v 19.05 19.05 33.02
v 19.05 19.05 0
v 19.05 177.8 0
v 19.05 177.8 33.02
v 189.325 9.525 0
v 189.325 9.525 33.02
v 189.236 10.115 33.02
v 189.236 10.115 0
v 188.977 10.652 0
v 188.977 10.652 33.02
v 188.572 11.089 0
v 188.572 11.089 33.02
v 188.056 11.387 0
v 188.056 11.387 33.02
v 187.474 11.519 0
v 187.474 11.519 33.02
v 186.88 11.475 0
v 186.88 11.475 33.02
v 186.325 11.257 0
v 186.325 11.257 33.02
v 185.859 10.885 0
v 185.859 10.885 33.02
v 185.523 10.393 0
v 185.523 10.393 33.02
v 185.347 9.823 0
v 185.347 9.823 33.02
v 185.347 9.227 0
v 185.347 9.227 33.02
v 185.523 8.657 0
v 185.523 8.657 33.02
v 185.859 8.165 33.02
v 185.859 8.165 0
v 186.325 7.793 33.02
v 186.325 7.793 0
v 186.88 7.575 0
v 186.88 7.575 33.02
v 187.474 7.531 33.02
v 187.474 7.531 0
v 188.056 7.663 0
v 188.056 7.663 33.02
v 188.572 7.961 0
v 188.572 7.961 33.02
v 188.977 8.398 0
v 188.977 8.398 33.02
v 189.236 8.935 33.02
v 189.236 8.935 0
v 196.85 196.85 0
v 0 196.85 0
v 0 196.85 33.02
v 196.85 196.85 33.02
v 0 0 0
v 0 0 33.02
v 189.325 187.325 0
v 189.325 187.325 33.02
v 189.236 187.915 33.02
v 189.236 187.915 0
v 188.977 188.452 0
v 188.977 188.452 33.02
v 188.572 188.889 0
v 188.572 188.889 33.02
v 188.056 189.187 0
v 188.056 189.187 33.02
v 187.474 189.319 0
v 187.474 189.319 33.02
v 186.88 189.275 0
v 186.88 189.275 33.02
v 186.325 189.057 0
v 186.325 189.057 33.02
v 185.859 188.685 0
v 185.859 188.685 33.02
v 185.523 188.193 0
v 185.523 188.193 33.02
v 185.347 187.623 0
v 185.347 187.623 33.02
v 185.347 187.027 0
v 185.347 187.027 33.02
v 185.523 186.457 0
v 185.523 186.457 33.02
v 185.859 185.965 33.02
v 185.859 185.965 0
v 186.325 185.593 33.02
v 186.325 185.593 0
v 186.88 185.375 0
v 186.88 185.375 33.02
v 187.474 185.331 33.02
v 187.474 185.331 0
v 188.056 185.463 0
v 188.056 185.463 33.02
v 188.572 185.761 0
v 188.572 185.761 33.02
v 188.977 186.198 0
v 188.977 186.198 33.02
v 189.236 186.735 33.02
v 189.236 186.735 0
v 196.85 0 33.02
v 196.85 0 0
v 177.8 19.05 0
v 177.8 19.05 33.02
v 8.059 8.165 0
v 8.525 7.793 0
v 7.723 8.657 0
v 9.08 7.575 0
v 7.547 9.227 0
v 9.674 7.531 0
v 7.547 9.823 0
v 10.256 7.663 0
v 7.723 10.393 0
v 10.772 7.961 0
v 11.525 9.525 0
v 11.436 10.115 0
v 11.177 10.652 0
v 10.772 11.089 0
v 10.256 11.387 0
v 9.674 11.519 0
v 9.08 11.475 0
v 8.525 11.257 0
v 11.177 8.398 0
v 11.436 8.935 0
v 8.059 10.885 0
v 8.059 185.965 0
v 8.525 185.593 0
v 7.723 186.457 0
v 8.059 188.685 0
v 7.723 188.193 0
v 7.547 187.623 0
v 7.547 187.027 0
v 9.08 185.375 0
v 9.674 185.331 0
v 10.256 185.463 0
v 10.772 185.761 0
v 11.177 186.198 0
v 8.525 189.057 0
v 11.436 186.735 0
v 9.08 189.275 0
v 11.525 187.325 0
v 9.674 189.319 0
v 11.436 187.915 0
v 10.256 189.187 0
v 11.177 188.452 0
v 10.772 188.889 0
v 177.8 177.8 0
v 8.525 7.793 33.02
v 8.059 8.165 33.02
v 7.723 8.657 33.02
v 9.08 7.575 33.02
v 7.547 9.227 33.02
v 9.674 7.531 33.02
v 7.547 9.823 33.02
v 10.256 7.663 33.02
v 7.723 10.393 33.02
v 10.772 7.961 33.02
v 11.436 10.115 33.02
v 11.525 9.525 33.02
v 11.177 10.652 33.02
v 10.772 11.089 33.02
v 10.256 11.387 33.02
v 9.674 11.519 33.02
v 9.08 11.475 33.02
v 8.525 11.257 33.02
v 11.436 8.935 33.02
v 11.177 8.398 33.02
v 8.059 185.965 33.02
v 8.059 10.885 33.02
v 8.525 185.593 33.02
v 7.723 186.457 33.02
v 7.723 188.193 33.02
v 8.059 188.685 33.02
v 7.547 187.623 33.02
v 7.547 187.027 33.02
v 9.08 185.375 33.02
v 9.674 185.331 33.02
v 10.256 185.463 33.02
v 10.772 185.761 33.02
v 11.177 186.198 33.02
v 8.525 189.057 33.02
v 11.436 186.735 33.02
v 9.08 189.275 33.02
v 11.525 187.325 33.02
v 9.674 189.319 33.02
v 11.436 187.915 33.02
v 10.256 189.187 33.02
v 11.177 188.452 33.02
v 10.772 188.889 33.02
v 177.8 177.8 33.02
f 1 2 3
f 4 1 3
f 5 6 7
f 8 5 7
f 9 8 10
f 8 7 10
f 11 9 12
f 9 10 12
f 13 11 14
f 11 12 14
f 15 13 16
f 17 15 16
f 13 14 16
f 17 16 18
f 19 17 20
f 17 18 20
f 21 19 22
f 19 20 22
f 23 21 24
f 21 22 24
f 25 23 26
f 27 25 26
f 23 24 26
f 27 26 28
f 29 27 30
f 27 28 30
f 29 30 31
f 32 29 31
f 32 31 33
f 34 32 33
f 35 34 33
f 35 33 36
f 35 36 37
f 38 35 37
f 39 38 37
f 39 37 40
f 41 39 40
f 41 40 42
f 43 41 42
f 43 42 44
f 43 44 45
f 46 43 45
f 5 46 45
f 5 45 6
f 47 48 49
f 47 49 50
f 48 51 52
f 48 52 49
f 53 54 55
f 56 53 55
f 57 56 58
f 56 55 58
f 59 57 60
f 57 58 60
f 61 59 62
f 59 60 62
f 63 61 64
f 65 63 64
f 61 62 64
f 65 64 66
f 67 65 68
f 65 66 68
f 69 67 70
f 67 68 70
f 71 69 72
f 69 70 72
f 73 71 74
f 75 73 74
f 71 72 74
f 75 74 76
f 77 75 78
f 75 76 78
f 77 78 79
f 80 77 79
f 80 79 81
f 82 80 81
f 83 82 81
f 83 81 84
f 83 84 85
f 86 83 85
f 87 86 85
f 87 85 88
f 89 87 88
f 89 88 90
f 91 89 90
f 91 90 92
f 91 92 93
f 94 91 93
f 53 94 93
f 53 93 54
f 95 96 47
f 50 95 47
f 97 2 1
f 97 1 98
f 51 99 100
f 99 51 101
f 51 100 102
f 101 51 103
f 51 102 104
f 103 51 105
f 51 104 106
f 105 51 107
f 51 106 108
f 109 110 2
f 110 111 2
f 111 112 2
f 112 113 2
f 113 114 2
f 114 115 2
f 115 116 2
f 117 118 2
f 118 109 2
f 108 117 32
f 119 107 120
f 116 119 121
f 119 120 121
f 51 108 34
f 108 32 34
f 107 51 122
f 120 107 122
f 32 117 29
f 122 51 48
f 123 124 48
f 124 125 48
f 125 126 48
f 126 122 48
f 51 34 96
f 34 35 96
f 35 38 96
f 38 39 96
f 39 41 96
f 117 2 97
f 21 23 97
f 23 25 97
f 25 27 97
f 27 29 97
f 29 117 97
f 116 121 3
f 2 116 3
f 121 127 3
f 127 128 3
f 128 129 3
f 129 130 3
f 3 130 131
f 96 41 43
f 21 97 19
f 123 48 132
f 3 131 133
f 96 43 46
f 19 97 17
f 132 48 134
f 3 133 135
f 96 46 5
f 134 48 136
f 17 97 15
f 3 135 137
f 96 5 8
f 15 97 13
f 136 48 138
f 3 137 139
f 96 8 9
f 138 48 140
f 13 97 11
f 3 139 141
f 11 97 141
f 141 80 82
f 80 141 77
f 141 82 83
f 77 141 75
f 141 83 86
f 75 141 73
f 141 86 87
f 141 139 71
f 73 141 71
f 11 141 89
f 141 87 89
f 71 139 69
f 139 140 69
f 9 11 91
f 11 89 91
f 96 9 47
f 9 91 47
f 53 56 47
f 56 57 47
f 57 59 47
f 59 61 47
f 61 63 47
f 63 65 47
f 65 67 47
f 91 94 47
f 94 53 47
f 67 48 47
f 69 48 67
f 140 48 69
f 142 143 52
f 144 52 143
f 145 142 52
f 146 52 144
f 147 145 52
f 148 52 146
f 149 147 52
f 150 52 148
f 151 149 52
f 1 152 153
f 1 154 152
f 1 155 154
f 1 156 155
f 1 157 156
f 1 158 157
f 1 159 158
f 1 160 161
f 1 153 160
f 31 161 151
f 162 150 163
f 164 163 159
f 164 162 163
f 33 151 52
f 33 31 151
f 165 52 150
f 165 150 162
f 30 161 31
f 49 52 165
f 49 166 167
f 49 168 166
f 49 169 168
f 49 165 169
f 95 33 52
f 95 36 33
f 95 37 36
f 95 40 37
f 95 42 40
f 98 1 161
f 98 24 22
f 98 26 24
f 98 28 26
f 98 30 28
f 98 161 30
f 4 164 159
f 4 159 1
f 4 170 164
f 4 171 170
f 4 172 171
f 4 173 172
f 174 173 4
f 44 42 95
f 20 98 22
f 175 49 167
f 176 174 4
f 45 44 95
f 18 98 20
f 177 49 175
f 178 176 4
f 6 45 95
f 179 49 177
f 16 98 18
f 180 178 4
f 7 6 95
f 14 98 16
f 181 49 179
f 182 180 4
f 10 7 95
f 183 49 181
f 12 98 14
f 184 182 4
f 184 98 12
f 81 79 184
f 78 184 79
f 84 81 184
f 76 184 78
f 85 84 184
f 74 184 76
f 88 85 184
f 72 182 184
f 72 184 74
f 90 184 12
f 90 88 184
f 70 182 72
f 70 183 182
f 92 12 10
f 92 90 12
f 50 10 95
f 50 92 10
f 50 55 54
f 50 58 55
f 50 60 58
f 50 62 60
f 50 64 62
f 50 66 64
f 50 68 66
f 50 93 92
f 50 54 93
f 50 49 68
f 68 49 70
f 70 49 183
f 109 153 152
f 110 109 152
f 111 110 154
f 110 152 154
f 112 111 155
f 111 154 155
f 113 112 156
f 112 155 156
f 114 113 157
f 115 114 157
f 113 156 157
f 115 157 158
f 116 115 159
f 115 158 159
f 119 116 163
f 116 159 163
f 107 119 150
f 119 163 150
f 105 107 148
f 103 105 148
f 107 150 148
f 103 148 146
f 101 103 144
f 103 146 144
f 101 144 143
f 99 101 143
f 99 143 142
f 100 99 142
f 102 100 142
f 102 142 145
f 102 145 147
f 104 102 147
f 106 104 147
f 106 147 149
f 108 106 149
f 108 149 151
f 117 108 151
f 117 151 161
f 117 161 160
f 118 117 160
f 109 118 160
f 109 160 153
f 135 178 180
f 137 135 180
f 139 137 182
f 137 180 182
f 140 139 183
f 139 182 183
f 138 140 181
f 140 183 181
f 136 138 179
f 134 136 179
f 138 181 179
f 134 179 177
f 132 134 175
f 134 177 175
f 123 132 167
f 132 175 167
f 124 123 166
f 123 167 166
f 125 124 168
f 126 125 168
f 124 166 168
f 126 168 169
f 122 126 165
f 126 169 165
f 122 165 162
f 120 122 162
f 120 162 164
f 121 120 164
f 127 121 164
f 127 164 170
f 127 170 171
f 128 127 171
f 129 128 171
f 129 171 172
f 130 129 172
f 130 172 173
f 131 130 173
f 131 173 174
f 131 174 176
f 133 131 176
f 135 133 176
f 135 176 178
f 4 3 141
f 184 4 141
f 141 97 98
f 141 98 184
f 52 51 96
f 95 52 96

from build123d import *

# Parameters (mm, degrees)
SKETCH001_R      = 2
EXTRUDE001_DEPTH = 40
SKETCH_W         = 196.85
SKETCH_H         = 196.85
SKETCH_W_2       = 158.75
SKETCH_H_2       = 158.75
EXTRUDE_DEPTH    = 33.02


with BuildPart() as extrude001:
    # Sketch001 (on Face10 of Extrude) → Extrude001 (new body)
    with BuildSketch(Plane.XY.offset(33.02)):
        with Locations((9.525, 187.325)):
            Circle(SKETCH001_R)
        with Locations((187.325, 187.325)):
            Circle(SKETCH001_R)
        with Locations((187.325, 9.525)):
            Circle(SKETCH001_R)
        with Locations((9.525, 9.525)):
            Circle(SKETCH001_R)
    extrude(amount=-EXTRUDE001_DEPTH)


with BuildPart() as wall:
    # Sketch → Extrude (new body)
    with BuildSketch(Plane.XY):
        with Locations((98.425, 98.425)):
            Rectangle(SKETCH_W, SKETCH_H)
        with Locations((98.425, 98.425)):
            Rectangle(SKETCH_W_2, SKETCH_H_2, mode=Mode.SUBTRACT)
    extrude(amount=EXTRUDE_DEPTH)

    # Cut: cut Extrude001
    add(extrude001.part, mode=Mode.SUBTRACT)


solid = wall.part
